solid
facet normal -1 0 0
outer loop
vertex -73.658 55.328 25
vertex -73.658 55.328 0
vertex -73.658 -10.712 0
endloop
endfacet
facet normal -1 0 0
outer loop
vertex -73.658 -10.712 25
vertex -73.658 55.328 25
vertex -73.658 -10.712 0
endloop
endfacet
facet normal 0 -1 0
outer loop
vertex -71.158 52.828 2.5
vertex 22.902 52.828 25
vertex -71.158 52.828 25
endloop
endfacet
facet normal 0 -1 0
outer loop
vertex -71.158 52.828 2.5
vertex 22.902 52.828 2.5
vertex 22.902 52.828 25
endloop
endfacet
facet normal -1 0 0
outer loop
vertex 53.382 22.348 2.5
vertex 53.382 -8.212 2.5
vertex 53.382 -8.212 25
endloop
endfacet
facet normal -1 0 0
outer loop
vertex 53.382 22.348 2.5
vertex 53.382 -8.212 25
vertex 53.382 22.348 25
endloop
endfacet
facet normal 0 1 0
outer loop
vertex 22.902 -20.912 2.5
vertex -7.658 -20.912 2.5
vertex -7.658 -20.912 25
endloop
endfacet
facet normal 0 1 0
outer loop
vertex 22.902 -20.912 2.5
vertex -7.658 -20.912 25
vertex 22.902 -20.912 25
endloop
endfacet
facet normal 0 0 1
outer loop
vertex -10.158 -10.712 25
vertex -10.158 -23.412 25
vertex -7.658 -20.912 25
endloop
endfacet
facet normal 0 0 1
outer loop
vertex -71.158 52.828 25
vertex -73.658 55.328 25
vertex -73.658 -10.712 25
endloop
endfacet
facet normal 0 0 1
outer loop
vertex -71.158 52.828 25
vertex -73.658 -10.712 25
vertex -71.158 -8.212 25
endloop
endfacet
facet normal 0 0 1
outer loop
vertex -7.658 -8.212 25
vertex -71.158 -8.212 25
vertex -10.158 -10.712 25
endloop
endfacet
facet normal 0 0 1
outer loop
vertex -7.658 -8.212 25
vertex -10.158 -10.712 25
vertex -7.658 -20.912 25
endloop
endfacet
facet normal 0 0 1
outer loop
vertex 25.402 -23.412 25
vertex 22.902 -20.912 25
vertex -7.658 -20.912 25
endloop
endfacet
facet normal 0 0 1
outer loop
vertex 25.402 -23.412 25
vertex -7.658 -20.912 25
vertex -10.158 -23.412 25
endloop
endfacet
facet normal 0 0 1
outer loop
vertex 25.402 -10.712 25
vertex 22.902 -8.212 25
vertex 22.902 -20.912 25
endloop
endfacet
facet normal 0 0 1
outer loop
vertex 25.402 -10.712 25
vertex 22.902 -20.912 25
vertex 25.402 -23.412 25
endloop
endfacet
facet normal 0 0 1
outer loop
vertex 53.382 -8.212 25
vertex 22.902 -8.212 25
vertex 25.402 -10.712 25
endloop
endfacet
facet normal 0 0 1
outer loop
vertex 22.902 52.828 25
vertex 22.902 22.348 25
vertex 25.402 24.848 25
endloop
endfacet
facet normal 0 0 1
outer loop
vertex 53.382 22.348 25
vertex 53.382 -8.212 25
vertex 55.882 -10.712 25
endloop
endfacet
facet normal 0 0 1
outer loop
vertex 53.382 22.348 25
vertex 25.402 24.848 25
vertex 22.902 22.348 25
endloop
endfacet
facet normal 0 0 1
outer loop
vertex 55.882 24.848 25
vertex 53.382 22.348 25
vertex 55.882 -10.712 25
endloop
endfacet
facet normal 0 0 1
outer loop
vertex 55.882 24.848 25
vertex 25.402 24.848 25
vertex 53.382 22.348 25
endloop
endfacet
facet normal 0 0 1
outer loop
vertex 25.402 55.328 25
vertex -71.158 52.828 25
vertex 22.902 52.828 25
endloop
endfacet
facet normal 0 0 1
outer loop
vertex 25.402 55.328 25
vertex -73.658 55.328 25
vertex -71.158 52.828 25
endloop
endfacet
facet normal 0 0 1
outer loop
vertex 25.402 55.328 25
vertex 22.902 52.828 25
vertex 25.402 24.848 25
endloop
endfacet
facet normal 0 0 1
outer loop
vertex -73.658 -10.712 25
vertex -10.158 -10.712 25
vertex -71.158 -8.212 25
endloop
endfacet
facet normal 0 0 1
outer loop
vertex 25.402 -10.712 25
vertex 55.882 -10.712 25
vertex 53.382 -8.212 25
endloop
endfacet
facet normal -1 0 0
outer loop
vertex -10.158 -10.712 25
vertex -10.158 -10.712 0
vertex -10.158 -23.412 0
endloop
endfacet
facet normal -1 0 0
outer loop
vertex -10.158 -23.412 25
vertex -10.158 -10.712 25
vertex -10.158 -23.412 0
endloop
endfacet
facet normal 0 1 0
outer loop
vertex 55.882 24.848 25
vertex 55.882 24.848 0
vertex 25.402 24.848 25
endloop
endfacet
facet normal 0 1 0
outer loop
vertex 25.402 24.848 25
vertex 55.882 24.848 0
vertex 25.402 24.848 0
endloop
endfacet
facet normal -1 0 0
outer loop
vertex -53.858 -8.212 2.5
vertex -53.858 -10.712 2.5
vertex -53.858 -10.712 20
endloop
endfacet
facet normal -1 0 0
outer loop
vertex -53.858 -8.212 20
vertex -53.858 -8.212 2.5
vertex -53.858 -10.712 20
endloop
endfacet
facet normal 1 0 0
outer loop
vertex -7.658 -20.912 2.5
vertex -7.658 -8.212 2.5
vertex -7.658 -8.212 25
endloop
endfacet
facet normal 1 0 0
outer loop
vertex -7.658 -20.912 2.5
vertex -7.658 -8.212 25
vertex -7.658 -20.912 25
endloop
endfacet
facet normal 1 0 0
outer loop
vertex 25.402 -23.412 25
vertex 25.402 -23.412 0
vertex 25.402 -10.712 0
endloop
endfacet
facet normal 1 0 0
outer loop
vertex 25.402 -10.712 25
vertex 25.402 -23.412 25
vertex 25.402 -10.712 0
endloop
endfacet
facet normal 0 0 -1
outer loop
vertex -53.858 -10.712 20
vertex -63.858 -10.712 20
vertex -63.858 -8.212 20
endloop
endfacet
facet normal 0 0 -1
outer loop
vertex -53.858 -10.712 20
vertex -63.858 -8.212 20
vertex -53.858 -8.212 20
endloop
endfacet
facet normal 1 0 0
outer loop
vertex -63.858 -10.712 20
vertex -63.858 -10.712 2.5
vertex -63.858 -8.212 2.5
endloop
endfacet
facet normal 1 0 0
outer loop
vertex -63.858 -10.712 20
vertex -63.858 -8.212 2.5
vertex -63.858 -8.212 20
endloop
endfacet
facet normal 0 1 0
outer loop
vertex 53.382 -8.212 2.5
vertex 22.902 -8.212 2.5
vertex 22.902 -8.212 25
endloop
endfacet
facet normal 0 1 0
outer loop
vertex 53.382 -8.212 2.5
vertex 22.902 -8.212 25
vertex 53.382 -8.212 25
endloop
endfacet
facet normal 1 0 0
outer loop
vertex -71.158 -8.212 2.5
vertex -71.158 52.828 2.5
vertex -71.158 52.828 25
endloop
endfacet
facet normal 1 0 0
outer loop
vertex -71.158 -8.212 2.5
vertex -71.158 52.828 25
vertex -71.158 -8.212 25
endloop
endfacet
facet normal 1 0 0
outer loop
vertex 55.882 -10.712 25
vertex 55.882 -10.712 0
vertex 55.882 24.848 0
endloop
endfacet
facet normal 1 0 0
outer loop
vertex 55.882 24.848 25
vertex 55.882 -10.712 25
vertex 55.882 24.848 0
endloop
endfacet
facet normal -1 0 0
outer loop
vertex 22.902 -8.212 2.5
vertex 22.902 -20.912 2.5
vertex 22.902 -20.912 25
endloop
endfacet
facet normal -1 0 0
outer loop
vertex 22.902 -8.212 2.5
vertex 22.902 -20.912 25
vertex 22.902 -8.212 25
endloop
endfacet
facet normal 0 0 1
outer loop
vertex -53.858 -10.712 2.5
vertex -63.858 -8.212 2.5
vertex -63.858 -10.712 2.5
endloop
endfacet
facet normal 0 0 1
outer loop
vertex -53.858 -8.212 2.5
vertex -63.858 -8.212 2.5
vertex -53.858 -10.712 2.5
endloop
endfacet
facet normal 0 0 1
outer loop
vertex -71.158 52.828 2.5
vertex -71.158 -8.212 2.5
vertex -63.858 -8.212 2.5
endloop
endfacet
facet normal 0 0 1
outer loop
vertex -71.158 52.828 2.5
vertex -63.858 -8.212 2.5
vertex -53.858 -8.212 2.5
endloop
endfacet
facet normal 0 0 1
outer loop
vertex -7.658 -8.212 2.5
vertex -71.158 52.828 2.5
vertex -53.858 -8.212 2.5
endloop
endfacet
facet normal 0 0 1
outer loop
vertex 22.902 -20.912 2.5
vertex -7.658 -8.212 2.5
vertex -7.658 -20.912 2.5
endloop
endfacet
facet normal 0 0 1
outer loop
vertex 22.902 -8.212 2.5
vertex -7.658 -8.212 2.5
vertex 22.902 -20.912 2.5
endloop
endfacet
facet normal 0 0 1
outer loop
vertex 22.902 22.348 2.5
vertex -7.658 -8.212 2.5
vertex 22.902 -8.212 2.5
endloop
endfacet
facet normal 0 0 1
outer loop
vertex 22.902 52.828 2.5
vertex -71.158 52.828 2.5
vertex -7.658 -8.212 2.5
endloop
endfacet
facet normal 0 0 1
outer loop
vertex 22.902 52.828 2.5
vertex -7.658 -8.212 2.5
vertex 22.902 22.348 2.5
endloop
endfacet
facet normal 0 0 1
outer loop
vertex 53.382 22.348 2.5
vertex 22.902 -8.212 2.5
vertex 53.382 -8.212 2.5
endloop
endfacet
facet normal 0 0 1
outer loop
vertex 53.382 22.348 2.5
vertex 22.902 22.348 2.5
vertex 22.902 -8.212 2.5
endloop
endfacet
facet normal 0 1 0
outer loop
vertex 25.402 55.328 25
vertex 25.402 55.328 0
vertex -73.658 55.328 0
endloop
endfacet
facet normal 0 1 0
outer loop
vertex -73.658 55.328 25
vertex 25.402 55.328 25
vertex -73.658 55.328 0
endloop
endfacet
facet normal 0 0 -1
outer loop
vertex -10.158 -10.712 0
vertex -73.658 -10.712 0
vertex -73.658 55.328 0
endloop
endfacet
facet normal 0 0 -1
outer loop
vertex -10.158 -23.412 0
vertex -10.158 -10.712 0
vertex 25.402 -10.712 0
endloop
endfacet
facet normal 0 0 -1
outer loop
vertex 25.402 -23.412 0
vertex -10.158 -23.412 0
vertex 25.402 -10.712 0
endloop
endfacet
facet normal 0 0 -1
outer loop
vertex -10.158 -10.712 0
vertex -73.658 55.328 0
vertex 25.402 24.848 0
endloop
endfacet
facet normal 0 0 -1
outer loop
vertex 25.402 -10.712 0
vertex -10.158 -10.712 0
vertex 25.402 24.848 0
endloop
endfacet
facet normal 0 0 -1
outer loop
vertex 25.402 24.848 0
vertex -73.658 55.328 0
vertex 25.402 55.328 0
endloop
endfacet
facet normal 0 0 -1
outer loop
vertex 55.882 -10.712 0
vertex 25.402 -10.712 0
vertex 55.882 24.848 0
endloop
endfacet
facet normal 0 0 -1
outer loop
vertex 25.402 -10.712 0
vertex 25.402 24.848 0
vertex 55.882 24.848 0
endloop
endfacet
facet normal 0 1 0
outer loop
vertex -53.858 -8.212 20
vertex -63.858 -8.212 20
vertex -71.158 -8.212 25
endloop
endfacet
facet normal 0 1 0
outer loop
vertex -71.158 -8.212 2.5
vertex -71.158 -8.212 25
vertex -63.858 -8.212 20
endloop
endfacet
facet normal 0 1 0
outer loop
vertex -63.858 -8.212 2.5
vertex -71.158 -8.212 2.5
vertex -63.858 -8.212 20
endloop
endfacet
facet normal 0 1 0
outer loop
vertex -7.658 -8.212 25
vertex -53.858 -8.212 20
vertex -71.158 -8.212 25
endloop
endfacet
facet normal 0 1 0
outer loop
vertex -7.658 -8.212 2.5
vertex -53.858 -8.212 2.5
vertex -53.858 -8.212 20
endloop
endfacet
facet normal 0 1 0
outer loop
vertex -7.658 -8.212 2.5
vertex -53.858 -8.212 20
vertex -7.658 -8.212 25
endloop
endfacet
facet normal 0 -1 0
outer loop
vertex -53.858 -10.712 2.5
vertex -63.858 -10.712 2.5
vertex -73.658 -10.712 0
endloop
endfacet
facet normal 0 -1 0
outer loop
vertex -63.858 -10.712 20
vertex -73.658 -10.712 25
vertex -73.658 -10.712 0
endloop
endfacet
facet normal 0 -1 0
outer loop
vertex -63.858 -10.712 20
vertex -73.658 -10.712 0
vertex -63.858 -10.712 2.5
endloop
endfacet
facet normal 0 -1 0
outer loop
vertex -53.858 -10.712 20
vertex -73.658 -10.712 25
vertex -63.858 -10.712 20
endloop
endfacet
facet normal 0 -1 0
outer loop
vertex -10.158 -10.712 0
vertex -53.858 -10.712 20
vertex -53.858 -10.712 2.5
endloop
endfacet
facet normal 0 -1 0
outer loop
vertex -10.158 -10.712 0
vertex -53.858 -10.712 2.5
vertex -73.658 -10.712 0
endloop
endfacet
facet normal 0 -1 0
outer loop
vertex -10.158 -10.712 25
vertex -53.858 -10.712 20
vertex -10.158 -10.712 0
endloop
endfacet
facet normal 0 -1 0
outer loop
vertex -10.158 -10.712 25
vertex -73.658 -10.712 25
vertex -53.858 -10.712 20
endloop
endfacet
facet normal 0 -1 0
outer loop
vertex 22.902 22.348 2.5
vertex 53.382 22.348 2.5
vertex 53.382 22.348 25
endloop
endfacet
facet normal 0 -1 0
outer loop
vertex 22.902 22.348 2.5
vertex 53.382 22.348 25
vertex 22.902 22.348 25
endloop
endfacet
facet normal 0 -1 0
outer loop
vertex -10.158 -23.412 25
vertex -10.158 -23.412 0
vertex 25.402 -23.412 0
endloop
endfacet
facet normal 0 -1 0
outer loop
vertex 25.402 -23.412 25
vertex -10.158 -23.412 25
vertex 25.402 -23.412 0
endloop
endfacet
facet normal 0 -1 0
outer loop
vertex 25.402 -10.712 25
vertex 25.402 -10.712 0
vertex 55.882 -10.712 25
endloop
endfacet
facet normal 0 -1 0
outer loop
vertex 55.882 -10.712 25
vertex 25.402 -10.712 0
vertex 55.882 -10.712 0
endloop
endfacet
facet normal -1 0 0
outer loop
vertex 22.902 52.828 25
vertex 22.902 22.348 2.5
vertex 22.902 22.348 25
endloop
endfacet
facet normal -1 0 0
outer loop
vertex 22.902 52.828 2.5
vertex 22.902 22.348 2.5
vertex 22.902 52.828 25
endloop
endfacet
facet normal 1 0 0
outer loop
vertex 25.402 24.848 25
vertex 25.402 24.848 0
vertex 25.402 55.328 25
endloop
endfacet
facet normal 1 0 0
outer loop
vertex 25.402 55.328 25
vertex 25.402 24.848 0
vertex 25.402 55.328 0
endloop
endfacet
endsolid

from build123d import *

# Parameters (mm, degrees)
F1_DEPTH = 25
F2_T     = -2.5
F3_W     = 10
F3_H     = 20
F4_DEPTH = 2.5
F5_DEPTH = 2.5


with BuildPart() as f1:
    # F0 (on Top) → F1 (new body)
    with BuildSketch(Plane.XY):
        Polygon((-73.6584961414, 55.3277601087), (-73.6584961414, -10.7122398913), (-10.1584961414, -10.7122398913), (-10.1584961414, -23.4122398913), (25.4015038586, -23.4122398913), (25.4015038586, -10.7122398913), (55.8815038586, -10.7122398913), (55.8815038586, 24.8477601087), (25.4015038586, 24.8477601087), (25.4015038586, 55.3277601087), align=None)
    extrude(amount=F1_DEPTH)

    # F2
    f2_openings = [f1.faces().sort_by_distance(p)[0] for p in [
        (-13.662154, 18.061578, 25),
    ]]
    offset(amount=F2_T, openings=f2_openings, kind=Kind.INTERSECTION)

    # F3 (on face) → F4 (cut)
    with BuildSketch(Plane.XZ.offset(10.7122398913)):
        with Locations((-58.8584271073, 10)):
            Rectangle(F3_W, F3_H)
    extrude(amount=-F4_DEPTH, mode=Mode.SUBTRACT)

    # F5 (add): a face of the model
    f5_faces = [f1.faces().sort_by_distance(p)[0] for p in [
        (-58.8584271073, -8.2122398913, 1.25),
    ]]
    extrude(f5_faces, amount=F5_DEPTH)


solid = f1.part
